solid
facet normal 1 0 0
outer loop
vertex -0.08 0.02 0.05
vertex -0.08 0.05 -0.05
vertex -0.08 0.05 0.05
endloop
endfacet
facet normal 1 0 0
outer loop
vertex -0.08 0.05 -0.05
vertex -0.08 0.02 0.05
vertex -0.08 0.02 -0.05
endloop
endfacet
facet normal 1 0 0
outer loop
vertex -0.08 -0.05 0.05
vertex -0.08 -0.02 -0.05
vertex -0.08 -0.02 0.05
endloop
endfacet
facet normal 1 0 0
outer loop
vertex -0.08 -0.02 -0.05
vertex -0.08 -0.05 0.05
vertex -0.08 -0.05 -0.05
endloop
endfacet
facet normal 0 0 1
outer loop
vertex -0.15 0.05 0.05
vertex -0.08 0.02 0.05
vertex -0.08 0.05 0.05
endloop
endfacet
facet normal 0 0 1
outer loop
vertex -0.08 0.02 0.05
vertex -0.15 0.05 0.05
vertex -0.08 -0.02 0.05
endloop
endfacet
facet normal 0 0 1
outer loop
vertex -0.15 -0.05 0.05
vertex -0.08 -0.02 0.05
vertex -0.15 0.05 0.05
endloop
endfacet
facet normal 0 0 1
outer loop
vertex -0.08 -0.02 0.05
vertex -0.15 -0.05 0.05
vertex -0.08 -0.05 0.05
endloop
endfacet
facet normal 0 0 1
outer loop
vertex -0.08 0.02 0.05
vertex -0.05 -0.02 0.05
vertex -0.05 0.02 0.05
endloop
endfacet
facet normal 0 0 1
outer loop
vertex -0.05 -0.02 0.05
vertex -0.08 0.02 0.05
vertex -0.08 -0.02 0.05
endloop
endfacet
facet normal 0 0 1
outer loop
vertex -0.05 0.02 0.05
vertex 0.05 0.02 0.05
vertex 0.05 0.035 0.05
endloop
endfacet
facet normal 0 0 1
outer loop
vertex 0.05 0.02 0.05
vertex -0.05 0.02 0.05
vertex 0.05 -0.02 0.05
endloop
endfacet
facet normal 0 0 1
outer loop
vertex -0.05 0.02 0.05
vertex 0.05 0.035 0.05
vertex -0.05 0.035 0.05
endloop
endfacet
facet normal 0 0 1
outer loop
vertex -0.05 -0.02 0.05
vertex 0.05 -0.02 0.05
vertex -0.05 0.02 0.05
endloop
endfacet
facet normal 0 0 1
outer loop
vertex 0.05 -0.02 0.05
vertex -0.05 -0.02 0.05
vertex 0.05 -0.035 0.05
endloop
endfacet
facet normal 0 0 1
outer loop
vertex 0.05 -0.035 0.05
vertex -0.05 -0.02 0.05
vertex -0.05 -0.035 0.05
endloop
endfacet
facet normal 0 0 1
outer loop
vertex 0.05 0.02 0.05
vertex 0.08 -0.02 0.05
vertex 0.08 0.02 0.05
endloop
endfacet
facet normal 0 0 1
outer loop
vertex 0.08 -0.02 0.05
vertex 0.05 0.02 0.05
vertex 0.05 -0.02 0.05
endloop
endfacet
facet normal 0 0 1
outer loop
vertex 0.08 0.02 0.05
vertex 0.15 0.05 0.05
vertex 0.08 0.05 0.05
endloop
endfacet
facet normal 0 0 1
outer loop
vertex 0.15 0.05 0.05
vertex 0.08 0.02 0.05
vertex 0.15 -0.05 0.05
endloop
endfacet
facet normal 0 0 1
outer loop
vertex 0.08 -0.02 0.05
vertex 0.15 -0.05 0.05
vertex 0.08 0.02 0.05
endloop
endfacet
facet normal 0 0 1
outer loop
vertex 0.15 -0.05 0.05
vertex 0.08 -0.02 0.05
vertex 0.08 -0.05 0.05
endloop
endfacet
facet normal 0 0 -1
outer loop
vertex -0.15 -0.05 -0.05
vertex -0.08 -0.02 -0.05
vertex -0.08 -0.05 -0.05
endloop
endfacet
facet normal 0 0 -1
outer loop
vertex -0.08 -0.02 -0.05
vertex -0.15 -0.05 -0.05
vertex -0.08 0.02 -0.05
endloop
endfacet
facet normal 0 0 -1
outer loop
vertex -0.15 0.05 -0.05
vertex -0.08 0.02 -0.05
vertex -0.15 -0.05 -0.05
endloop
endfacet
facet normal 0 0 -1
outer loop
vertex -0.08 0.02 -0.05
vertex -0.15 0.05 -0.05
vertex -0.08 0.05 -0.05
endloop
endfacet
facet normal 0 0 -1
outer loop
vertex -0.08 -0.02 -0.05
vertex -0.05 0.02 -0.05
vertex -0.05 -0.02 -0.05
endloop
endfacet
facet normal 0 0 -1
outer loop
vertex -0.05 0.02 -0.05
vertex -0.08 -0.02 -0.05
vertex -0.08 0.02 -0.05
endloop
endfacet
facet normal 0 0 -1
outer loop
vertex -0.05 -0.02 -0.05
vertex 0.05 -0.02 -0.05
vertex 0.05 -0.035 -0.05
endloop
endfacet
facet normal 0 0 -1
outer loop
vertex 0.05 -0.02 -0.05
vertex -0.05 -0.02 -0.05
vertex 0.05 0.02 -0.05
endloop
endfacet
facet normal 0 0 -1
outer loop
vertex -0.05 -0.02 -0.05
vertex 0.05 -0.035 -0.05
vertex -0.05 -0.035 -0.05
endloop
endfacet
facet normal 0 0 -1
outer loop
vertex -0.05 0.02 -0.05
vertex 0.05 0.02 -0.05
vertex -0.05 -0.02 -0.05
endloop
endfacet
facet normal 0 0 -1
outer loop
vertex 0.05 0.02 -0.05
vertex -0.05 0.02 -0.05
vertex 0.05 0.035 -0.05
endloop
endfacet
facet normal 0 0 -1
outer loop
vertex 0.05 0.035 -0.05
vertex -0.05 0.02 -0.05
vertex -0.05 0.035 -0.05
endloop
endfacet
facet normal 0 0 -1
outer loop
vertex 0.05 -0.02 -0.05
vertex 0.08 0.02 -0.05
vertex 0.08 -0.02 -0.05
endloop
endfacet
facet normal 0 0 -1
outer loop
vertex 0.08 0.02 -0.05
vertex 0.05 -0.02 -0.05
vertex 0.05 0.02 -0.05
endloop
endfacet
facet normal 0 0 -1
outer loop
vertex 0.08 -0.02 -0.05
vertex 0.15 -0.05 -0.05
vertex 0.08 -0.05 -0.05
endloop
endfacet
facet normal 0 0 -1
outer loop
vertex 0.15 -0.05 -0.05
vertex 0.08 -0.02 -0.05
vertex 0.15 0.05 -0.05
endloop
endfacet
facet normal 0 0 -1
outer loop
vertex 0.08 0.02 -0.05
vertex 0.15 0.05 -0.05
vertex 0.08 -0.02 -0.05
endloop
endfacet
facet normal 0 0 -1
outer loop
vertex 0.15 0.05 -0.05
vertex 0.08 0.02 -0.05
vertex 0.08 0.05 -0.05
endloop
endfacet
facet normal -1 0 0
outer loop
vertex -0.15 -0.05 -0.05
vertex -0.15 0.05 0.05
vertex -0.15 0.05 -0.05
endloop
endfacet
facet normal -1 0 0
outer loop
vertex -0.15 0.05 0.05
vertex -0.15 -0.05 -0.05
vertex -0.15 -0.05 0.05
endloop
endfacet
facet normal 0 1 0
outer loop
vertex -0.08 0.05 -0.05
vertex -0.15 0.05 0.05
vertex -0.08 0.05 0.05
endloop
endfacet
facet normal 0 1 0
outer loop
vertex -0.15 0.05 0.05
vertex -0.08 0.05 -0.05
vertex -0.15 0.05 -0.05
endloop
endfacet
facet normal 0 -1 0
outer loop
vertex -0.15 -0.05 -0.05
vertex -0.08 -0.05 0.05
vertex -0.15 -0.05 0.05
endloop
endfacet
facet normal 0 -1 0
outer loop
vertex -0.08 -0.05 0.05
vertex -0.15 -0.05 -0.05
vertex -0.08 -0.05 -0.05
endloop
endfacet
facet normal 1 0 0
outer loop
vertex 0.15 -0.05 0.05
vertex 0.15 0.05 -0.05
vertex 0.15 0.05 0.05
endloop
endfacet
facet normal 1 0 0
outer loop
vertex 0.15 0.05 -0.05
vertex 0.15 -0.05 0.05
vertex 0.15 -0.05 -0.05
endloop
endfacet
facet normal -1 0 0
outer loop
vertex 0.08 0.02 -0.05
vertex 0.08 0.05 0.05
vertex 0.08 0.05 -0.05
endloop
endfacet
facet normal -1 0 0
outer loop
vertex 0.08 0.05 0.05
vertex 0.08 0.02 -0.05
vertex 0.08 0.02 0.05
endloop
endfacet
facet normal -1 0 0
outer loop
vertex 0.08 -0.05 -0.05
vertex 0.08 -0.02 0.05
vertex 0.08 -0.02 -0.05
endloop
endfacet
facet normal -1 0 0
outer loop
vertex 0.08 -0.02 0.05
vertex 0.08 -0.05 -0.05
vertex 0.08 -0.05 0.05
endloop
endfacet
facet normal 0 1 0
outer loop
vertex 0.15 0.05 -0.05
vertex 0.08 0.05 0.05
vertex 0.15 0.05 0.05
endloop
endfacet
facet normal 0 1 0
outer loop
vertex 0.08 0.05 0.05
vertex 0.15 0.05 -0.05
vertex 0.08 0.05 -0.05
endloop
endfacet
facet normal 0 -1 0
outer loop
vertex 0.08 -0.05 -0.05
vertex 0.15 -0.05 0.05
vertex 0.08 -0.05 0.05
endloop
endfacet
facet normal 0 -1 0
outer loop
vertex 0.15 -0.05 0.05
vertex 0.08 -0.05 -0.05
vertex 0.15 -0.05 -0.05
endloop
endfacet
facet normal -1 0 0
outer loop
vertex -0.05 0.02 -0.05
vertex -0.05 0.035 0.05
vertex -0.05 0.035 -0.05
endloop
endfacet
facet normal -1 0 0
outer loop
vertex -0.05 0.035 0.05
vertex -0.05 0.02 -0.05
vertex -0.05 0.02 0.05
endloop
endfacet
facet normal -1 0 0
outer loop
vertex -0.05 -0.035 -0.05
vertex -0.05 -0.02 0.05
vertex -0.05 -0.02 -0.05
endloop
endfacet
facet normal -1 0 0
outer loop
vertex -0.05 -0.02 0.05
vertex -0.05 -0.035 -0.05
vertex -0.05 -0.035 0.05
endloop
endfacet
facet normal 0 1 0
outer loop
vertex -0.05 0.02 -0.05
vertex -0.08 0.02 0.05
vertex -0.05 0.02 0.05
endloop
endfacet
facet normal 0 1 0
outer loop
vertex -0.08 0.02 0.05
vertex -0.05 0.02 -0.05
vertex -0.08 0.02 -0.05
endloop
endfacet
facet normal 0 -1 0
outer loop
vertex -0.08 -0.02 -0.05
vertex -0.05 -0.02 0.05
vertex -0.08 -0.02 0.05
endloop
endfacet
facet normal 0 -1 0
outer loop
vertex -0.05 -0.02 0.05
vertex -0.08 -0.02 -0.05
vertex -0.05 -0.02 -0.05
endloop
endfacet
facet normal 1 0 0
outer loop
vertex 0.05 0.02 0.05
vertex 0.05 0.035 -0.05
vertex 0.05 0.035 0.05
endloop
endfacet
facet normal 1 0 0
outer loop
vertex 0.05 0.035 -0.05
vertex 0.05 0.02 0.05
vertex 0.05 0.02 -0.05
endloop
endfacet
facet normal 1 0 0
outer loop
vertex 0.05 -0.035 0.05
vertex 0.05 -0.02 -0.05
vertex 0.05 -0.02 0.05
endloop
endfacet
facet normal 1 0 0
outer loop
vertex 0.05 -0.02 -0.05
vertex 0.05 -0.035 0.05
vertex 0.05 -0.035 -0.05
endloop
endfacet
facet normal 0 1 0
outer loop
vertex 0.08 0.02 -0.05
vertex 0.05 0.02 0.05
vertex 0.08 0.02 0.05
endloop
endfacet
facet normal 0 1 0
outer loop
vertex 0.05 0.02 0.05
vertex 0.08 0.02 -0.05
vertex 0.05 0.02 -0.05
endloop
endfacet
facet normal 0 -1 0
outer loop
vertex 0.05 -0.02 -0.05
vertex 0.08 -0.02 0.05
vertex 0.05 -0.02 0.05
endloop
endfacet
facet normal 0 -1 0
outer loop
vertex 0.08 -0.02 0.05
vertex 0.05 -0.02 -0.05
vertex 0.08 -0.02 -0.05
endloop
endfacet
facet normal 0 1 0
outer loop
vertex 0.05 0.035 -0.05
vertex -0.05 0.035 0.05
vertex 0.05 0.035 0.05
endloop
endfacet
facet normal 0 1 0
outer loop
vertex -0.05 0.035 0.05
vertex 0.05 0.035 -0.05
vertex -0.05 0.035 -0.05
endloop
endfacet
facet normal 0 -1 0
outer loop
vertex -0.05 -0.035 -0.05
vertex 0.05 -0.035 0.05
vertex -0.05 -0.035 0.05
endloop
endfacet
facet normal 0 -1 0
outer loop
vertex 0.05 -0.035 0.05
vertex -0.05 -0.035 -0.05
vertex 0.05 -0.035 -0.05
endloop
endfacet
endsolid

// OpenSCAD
$fn=64;

L = 0.3;
W_end = 0.1;
H = 0.1;

L_end = 0.07;
L_mid = 0.10;
L_web = (L - 2*L_end - L_mid)/2;

W_web = 0.04;
W_mid = 0.07;

module seg(len, wid, hgt){
    cube([len, wid, hgt], center=true);
}

module dumbbell_bar(){
    union(){
        translate([-(L/2 - L_end/2), 0, 0]) seg(L_end, W_end, H);
        translate([ (L/2 - L_end/2), 0, 0]) seg(L_end, W_end, H);

        translate([-(L_mid/2 + L_web/2), 0, 0]) seg(L_web, W_web, H);
        translate([ (L_mid/2 + L_web/2), 0, 0]) seg(L_web, W_web, H);

        seg(L_mid, W_mid, H);
    }
}

dumbbell_bar();
